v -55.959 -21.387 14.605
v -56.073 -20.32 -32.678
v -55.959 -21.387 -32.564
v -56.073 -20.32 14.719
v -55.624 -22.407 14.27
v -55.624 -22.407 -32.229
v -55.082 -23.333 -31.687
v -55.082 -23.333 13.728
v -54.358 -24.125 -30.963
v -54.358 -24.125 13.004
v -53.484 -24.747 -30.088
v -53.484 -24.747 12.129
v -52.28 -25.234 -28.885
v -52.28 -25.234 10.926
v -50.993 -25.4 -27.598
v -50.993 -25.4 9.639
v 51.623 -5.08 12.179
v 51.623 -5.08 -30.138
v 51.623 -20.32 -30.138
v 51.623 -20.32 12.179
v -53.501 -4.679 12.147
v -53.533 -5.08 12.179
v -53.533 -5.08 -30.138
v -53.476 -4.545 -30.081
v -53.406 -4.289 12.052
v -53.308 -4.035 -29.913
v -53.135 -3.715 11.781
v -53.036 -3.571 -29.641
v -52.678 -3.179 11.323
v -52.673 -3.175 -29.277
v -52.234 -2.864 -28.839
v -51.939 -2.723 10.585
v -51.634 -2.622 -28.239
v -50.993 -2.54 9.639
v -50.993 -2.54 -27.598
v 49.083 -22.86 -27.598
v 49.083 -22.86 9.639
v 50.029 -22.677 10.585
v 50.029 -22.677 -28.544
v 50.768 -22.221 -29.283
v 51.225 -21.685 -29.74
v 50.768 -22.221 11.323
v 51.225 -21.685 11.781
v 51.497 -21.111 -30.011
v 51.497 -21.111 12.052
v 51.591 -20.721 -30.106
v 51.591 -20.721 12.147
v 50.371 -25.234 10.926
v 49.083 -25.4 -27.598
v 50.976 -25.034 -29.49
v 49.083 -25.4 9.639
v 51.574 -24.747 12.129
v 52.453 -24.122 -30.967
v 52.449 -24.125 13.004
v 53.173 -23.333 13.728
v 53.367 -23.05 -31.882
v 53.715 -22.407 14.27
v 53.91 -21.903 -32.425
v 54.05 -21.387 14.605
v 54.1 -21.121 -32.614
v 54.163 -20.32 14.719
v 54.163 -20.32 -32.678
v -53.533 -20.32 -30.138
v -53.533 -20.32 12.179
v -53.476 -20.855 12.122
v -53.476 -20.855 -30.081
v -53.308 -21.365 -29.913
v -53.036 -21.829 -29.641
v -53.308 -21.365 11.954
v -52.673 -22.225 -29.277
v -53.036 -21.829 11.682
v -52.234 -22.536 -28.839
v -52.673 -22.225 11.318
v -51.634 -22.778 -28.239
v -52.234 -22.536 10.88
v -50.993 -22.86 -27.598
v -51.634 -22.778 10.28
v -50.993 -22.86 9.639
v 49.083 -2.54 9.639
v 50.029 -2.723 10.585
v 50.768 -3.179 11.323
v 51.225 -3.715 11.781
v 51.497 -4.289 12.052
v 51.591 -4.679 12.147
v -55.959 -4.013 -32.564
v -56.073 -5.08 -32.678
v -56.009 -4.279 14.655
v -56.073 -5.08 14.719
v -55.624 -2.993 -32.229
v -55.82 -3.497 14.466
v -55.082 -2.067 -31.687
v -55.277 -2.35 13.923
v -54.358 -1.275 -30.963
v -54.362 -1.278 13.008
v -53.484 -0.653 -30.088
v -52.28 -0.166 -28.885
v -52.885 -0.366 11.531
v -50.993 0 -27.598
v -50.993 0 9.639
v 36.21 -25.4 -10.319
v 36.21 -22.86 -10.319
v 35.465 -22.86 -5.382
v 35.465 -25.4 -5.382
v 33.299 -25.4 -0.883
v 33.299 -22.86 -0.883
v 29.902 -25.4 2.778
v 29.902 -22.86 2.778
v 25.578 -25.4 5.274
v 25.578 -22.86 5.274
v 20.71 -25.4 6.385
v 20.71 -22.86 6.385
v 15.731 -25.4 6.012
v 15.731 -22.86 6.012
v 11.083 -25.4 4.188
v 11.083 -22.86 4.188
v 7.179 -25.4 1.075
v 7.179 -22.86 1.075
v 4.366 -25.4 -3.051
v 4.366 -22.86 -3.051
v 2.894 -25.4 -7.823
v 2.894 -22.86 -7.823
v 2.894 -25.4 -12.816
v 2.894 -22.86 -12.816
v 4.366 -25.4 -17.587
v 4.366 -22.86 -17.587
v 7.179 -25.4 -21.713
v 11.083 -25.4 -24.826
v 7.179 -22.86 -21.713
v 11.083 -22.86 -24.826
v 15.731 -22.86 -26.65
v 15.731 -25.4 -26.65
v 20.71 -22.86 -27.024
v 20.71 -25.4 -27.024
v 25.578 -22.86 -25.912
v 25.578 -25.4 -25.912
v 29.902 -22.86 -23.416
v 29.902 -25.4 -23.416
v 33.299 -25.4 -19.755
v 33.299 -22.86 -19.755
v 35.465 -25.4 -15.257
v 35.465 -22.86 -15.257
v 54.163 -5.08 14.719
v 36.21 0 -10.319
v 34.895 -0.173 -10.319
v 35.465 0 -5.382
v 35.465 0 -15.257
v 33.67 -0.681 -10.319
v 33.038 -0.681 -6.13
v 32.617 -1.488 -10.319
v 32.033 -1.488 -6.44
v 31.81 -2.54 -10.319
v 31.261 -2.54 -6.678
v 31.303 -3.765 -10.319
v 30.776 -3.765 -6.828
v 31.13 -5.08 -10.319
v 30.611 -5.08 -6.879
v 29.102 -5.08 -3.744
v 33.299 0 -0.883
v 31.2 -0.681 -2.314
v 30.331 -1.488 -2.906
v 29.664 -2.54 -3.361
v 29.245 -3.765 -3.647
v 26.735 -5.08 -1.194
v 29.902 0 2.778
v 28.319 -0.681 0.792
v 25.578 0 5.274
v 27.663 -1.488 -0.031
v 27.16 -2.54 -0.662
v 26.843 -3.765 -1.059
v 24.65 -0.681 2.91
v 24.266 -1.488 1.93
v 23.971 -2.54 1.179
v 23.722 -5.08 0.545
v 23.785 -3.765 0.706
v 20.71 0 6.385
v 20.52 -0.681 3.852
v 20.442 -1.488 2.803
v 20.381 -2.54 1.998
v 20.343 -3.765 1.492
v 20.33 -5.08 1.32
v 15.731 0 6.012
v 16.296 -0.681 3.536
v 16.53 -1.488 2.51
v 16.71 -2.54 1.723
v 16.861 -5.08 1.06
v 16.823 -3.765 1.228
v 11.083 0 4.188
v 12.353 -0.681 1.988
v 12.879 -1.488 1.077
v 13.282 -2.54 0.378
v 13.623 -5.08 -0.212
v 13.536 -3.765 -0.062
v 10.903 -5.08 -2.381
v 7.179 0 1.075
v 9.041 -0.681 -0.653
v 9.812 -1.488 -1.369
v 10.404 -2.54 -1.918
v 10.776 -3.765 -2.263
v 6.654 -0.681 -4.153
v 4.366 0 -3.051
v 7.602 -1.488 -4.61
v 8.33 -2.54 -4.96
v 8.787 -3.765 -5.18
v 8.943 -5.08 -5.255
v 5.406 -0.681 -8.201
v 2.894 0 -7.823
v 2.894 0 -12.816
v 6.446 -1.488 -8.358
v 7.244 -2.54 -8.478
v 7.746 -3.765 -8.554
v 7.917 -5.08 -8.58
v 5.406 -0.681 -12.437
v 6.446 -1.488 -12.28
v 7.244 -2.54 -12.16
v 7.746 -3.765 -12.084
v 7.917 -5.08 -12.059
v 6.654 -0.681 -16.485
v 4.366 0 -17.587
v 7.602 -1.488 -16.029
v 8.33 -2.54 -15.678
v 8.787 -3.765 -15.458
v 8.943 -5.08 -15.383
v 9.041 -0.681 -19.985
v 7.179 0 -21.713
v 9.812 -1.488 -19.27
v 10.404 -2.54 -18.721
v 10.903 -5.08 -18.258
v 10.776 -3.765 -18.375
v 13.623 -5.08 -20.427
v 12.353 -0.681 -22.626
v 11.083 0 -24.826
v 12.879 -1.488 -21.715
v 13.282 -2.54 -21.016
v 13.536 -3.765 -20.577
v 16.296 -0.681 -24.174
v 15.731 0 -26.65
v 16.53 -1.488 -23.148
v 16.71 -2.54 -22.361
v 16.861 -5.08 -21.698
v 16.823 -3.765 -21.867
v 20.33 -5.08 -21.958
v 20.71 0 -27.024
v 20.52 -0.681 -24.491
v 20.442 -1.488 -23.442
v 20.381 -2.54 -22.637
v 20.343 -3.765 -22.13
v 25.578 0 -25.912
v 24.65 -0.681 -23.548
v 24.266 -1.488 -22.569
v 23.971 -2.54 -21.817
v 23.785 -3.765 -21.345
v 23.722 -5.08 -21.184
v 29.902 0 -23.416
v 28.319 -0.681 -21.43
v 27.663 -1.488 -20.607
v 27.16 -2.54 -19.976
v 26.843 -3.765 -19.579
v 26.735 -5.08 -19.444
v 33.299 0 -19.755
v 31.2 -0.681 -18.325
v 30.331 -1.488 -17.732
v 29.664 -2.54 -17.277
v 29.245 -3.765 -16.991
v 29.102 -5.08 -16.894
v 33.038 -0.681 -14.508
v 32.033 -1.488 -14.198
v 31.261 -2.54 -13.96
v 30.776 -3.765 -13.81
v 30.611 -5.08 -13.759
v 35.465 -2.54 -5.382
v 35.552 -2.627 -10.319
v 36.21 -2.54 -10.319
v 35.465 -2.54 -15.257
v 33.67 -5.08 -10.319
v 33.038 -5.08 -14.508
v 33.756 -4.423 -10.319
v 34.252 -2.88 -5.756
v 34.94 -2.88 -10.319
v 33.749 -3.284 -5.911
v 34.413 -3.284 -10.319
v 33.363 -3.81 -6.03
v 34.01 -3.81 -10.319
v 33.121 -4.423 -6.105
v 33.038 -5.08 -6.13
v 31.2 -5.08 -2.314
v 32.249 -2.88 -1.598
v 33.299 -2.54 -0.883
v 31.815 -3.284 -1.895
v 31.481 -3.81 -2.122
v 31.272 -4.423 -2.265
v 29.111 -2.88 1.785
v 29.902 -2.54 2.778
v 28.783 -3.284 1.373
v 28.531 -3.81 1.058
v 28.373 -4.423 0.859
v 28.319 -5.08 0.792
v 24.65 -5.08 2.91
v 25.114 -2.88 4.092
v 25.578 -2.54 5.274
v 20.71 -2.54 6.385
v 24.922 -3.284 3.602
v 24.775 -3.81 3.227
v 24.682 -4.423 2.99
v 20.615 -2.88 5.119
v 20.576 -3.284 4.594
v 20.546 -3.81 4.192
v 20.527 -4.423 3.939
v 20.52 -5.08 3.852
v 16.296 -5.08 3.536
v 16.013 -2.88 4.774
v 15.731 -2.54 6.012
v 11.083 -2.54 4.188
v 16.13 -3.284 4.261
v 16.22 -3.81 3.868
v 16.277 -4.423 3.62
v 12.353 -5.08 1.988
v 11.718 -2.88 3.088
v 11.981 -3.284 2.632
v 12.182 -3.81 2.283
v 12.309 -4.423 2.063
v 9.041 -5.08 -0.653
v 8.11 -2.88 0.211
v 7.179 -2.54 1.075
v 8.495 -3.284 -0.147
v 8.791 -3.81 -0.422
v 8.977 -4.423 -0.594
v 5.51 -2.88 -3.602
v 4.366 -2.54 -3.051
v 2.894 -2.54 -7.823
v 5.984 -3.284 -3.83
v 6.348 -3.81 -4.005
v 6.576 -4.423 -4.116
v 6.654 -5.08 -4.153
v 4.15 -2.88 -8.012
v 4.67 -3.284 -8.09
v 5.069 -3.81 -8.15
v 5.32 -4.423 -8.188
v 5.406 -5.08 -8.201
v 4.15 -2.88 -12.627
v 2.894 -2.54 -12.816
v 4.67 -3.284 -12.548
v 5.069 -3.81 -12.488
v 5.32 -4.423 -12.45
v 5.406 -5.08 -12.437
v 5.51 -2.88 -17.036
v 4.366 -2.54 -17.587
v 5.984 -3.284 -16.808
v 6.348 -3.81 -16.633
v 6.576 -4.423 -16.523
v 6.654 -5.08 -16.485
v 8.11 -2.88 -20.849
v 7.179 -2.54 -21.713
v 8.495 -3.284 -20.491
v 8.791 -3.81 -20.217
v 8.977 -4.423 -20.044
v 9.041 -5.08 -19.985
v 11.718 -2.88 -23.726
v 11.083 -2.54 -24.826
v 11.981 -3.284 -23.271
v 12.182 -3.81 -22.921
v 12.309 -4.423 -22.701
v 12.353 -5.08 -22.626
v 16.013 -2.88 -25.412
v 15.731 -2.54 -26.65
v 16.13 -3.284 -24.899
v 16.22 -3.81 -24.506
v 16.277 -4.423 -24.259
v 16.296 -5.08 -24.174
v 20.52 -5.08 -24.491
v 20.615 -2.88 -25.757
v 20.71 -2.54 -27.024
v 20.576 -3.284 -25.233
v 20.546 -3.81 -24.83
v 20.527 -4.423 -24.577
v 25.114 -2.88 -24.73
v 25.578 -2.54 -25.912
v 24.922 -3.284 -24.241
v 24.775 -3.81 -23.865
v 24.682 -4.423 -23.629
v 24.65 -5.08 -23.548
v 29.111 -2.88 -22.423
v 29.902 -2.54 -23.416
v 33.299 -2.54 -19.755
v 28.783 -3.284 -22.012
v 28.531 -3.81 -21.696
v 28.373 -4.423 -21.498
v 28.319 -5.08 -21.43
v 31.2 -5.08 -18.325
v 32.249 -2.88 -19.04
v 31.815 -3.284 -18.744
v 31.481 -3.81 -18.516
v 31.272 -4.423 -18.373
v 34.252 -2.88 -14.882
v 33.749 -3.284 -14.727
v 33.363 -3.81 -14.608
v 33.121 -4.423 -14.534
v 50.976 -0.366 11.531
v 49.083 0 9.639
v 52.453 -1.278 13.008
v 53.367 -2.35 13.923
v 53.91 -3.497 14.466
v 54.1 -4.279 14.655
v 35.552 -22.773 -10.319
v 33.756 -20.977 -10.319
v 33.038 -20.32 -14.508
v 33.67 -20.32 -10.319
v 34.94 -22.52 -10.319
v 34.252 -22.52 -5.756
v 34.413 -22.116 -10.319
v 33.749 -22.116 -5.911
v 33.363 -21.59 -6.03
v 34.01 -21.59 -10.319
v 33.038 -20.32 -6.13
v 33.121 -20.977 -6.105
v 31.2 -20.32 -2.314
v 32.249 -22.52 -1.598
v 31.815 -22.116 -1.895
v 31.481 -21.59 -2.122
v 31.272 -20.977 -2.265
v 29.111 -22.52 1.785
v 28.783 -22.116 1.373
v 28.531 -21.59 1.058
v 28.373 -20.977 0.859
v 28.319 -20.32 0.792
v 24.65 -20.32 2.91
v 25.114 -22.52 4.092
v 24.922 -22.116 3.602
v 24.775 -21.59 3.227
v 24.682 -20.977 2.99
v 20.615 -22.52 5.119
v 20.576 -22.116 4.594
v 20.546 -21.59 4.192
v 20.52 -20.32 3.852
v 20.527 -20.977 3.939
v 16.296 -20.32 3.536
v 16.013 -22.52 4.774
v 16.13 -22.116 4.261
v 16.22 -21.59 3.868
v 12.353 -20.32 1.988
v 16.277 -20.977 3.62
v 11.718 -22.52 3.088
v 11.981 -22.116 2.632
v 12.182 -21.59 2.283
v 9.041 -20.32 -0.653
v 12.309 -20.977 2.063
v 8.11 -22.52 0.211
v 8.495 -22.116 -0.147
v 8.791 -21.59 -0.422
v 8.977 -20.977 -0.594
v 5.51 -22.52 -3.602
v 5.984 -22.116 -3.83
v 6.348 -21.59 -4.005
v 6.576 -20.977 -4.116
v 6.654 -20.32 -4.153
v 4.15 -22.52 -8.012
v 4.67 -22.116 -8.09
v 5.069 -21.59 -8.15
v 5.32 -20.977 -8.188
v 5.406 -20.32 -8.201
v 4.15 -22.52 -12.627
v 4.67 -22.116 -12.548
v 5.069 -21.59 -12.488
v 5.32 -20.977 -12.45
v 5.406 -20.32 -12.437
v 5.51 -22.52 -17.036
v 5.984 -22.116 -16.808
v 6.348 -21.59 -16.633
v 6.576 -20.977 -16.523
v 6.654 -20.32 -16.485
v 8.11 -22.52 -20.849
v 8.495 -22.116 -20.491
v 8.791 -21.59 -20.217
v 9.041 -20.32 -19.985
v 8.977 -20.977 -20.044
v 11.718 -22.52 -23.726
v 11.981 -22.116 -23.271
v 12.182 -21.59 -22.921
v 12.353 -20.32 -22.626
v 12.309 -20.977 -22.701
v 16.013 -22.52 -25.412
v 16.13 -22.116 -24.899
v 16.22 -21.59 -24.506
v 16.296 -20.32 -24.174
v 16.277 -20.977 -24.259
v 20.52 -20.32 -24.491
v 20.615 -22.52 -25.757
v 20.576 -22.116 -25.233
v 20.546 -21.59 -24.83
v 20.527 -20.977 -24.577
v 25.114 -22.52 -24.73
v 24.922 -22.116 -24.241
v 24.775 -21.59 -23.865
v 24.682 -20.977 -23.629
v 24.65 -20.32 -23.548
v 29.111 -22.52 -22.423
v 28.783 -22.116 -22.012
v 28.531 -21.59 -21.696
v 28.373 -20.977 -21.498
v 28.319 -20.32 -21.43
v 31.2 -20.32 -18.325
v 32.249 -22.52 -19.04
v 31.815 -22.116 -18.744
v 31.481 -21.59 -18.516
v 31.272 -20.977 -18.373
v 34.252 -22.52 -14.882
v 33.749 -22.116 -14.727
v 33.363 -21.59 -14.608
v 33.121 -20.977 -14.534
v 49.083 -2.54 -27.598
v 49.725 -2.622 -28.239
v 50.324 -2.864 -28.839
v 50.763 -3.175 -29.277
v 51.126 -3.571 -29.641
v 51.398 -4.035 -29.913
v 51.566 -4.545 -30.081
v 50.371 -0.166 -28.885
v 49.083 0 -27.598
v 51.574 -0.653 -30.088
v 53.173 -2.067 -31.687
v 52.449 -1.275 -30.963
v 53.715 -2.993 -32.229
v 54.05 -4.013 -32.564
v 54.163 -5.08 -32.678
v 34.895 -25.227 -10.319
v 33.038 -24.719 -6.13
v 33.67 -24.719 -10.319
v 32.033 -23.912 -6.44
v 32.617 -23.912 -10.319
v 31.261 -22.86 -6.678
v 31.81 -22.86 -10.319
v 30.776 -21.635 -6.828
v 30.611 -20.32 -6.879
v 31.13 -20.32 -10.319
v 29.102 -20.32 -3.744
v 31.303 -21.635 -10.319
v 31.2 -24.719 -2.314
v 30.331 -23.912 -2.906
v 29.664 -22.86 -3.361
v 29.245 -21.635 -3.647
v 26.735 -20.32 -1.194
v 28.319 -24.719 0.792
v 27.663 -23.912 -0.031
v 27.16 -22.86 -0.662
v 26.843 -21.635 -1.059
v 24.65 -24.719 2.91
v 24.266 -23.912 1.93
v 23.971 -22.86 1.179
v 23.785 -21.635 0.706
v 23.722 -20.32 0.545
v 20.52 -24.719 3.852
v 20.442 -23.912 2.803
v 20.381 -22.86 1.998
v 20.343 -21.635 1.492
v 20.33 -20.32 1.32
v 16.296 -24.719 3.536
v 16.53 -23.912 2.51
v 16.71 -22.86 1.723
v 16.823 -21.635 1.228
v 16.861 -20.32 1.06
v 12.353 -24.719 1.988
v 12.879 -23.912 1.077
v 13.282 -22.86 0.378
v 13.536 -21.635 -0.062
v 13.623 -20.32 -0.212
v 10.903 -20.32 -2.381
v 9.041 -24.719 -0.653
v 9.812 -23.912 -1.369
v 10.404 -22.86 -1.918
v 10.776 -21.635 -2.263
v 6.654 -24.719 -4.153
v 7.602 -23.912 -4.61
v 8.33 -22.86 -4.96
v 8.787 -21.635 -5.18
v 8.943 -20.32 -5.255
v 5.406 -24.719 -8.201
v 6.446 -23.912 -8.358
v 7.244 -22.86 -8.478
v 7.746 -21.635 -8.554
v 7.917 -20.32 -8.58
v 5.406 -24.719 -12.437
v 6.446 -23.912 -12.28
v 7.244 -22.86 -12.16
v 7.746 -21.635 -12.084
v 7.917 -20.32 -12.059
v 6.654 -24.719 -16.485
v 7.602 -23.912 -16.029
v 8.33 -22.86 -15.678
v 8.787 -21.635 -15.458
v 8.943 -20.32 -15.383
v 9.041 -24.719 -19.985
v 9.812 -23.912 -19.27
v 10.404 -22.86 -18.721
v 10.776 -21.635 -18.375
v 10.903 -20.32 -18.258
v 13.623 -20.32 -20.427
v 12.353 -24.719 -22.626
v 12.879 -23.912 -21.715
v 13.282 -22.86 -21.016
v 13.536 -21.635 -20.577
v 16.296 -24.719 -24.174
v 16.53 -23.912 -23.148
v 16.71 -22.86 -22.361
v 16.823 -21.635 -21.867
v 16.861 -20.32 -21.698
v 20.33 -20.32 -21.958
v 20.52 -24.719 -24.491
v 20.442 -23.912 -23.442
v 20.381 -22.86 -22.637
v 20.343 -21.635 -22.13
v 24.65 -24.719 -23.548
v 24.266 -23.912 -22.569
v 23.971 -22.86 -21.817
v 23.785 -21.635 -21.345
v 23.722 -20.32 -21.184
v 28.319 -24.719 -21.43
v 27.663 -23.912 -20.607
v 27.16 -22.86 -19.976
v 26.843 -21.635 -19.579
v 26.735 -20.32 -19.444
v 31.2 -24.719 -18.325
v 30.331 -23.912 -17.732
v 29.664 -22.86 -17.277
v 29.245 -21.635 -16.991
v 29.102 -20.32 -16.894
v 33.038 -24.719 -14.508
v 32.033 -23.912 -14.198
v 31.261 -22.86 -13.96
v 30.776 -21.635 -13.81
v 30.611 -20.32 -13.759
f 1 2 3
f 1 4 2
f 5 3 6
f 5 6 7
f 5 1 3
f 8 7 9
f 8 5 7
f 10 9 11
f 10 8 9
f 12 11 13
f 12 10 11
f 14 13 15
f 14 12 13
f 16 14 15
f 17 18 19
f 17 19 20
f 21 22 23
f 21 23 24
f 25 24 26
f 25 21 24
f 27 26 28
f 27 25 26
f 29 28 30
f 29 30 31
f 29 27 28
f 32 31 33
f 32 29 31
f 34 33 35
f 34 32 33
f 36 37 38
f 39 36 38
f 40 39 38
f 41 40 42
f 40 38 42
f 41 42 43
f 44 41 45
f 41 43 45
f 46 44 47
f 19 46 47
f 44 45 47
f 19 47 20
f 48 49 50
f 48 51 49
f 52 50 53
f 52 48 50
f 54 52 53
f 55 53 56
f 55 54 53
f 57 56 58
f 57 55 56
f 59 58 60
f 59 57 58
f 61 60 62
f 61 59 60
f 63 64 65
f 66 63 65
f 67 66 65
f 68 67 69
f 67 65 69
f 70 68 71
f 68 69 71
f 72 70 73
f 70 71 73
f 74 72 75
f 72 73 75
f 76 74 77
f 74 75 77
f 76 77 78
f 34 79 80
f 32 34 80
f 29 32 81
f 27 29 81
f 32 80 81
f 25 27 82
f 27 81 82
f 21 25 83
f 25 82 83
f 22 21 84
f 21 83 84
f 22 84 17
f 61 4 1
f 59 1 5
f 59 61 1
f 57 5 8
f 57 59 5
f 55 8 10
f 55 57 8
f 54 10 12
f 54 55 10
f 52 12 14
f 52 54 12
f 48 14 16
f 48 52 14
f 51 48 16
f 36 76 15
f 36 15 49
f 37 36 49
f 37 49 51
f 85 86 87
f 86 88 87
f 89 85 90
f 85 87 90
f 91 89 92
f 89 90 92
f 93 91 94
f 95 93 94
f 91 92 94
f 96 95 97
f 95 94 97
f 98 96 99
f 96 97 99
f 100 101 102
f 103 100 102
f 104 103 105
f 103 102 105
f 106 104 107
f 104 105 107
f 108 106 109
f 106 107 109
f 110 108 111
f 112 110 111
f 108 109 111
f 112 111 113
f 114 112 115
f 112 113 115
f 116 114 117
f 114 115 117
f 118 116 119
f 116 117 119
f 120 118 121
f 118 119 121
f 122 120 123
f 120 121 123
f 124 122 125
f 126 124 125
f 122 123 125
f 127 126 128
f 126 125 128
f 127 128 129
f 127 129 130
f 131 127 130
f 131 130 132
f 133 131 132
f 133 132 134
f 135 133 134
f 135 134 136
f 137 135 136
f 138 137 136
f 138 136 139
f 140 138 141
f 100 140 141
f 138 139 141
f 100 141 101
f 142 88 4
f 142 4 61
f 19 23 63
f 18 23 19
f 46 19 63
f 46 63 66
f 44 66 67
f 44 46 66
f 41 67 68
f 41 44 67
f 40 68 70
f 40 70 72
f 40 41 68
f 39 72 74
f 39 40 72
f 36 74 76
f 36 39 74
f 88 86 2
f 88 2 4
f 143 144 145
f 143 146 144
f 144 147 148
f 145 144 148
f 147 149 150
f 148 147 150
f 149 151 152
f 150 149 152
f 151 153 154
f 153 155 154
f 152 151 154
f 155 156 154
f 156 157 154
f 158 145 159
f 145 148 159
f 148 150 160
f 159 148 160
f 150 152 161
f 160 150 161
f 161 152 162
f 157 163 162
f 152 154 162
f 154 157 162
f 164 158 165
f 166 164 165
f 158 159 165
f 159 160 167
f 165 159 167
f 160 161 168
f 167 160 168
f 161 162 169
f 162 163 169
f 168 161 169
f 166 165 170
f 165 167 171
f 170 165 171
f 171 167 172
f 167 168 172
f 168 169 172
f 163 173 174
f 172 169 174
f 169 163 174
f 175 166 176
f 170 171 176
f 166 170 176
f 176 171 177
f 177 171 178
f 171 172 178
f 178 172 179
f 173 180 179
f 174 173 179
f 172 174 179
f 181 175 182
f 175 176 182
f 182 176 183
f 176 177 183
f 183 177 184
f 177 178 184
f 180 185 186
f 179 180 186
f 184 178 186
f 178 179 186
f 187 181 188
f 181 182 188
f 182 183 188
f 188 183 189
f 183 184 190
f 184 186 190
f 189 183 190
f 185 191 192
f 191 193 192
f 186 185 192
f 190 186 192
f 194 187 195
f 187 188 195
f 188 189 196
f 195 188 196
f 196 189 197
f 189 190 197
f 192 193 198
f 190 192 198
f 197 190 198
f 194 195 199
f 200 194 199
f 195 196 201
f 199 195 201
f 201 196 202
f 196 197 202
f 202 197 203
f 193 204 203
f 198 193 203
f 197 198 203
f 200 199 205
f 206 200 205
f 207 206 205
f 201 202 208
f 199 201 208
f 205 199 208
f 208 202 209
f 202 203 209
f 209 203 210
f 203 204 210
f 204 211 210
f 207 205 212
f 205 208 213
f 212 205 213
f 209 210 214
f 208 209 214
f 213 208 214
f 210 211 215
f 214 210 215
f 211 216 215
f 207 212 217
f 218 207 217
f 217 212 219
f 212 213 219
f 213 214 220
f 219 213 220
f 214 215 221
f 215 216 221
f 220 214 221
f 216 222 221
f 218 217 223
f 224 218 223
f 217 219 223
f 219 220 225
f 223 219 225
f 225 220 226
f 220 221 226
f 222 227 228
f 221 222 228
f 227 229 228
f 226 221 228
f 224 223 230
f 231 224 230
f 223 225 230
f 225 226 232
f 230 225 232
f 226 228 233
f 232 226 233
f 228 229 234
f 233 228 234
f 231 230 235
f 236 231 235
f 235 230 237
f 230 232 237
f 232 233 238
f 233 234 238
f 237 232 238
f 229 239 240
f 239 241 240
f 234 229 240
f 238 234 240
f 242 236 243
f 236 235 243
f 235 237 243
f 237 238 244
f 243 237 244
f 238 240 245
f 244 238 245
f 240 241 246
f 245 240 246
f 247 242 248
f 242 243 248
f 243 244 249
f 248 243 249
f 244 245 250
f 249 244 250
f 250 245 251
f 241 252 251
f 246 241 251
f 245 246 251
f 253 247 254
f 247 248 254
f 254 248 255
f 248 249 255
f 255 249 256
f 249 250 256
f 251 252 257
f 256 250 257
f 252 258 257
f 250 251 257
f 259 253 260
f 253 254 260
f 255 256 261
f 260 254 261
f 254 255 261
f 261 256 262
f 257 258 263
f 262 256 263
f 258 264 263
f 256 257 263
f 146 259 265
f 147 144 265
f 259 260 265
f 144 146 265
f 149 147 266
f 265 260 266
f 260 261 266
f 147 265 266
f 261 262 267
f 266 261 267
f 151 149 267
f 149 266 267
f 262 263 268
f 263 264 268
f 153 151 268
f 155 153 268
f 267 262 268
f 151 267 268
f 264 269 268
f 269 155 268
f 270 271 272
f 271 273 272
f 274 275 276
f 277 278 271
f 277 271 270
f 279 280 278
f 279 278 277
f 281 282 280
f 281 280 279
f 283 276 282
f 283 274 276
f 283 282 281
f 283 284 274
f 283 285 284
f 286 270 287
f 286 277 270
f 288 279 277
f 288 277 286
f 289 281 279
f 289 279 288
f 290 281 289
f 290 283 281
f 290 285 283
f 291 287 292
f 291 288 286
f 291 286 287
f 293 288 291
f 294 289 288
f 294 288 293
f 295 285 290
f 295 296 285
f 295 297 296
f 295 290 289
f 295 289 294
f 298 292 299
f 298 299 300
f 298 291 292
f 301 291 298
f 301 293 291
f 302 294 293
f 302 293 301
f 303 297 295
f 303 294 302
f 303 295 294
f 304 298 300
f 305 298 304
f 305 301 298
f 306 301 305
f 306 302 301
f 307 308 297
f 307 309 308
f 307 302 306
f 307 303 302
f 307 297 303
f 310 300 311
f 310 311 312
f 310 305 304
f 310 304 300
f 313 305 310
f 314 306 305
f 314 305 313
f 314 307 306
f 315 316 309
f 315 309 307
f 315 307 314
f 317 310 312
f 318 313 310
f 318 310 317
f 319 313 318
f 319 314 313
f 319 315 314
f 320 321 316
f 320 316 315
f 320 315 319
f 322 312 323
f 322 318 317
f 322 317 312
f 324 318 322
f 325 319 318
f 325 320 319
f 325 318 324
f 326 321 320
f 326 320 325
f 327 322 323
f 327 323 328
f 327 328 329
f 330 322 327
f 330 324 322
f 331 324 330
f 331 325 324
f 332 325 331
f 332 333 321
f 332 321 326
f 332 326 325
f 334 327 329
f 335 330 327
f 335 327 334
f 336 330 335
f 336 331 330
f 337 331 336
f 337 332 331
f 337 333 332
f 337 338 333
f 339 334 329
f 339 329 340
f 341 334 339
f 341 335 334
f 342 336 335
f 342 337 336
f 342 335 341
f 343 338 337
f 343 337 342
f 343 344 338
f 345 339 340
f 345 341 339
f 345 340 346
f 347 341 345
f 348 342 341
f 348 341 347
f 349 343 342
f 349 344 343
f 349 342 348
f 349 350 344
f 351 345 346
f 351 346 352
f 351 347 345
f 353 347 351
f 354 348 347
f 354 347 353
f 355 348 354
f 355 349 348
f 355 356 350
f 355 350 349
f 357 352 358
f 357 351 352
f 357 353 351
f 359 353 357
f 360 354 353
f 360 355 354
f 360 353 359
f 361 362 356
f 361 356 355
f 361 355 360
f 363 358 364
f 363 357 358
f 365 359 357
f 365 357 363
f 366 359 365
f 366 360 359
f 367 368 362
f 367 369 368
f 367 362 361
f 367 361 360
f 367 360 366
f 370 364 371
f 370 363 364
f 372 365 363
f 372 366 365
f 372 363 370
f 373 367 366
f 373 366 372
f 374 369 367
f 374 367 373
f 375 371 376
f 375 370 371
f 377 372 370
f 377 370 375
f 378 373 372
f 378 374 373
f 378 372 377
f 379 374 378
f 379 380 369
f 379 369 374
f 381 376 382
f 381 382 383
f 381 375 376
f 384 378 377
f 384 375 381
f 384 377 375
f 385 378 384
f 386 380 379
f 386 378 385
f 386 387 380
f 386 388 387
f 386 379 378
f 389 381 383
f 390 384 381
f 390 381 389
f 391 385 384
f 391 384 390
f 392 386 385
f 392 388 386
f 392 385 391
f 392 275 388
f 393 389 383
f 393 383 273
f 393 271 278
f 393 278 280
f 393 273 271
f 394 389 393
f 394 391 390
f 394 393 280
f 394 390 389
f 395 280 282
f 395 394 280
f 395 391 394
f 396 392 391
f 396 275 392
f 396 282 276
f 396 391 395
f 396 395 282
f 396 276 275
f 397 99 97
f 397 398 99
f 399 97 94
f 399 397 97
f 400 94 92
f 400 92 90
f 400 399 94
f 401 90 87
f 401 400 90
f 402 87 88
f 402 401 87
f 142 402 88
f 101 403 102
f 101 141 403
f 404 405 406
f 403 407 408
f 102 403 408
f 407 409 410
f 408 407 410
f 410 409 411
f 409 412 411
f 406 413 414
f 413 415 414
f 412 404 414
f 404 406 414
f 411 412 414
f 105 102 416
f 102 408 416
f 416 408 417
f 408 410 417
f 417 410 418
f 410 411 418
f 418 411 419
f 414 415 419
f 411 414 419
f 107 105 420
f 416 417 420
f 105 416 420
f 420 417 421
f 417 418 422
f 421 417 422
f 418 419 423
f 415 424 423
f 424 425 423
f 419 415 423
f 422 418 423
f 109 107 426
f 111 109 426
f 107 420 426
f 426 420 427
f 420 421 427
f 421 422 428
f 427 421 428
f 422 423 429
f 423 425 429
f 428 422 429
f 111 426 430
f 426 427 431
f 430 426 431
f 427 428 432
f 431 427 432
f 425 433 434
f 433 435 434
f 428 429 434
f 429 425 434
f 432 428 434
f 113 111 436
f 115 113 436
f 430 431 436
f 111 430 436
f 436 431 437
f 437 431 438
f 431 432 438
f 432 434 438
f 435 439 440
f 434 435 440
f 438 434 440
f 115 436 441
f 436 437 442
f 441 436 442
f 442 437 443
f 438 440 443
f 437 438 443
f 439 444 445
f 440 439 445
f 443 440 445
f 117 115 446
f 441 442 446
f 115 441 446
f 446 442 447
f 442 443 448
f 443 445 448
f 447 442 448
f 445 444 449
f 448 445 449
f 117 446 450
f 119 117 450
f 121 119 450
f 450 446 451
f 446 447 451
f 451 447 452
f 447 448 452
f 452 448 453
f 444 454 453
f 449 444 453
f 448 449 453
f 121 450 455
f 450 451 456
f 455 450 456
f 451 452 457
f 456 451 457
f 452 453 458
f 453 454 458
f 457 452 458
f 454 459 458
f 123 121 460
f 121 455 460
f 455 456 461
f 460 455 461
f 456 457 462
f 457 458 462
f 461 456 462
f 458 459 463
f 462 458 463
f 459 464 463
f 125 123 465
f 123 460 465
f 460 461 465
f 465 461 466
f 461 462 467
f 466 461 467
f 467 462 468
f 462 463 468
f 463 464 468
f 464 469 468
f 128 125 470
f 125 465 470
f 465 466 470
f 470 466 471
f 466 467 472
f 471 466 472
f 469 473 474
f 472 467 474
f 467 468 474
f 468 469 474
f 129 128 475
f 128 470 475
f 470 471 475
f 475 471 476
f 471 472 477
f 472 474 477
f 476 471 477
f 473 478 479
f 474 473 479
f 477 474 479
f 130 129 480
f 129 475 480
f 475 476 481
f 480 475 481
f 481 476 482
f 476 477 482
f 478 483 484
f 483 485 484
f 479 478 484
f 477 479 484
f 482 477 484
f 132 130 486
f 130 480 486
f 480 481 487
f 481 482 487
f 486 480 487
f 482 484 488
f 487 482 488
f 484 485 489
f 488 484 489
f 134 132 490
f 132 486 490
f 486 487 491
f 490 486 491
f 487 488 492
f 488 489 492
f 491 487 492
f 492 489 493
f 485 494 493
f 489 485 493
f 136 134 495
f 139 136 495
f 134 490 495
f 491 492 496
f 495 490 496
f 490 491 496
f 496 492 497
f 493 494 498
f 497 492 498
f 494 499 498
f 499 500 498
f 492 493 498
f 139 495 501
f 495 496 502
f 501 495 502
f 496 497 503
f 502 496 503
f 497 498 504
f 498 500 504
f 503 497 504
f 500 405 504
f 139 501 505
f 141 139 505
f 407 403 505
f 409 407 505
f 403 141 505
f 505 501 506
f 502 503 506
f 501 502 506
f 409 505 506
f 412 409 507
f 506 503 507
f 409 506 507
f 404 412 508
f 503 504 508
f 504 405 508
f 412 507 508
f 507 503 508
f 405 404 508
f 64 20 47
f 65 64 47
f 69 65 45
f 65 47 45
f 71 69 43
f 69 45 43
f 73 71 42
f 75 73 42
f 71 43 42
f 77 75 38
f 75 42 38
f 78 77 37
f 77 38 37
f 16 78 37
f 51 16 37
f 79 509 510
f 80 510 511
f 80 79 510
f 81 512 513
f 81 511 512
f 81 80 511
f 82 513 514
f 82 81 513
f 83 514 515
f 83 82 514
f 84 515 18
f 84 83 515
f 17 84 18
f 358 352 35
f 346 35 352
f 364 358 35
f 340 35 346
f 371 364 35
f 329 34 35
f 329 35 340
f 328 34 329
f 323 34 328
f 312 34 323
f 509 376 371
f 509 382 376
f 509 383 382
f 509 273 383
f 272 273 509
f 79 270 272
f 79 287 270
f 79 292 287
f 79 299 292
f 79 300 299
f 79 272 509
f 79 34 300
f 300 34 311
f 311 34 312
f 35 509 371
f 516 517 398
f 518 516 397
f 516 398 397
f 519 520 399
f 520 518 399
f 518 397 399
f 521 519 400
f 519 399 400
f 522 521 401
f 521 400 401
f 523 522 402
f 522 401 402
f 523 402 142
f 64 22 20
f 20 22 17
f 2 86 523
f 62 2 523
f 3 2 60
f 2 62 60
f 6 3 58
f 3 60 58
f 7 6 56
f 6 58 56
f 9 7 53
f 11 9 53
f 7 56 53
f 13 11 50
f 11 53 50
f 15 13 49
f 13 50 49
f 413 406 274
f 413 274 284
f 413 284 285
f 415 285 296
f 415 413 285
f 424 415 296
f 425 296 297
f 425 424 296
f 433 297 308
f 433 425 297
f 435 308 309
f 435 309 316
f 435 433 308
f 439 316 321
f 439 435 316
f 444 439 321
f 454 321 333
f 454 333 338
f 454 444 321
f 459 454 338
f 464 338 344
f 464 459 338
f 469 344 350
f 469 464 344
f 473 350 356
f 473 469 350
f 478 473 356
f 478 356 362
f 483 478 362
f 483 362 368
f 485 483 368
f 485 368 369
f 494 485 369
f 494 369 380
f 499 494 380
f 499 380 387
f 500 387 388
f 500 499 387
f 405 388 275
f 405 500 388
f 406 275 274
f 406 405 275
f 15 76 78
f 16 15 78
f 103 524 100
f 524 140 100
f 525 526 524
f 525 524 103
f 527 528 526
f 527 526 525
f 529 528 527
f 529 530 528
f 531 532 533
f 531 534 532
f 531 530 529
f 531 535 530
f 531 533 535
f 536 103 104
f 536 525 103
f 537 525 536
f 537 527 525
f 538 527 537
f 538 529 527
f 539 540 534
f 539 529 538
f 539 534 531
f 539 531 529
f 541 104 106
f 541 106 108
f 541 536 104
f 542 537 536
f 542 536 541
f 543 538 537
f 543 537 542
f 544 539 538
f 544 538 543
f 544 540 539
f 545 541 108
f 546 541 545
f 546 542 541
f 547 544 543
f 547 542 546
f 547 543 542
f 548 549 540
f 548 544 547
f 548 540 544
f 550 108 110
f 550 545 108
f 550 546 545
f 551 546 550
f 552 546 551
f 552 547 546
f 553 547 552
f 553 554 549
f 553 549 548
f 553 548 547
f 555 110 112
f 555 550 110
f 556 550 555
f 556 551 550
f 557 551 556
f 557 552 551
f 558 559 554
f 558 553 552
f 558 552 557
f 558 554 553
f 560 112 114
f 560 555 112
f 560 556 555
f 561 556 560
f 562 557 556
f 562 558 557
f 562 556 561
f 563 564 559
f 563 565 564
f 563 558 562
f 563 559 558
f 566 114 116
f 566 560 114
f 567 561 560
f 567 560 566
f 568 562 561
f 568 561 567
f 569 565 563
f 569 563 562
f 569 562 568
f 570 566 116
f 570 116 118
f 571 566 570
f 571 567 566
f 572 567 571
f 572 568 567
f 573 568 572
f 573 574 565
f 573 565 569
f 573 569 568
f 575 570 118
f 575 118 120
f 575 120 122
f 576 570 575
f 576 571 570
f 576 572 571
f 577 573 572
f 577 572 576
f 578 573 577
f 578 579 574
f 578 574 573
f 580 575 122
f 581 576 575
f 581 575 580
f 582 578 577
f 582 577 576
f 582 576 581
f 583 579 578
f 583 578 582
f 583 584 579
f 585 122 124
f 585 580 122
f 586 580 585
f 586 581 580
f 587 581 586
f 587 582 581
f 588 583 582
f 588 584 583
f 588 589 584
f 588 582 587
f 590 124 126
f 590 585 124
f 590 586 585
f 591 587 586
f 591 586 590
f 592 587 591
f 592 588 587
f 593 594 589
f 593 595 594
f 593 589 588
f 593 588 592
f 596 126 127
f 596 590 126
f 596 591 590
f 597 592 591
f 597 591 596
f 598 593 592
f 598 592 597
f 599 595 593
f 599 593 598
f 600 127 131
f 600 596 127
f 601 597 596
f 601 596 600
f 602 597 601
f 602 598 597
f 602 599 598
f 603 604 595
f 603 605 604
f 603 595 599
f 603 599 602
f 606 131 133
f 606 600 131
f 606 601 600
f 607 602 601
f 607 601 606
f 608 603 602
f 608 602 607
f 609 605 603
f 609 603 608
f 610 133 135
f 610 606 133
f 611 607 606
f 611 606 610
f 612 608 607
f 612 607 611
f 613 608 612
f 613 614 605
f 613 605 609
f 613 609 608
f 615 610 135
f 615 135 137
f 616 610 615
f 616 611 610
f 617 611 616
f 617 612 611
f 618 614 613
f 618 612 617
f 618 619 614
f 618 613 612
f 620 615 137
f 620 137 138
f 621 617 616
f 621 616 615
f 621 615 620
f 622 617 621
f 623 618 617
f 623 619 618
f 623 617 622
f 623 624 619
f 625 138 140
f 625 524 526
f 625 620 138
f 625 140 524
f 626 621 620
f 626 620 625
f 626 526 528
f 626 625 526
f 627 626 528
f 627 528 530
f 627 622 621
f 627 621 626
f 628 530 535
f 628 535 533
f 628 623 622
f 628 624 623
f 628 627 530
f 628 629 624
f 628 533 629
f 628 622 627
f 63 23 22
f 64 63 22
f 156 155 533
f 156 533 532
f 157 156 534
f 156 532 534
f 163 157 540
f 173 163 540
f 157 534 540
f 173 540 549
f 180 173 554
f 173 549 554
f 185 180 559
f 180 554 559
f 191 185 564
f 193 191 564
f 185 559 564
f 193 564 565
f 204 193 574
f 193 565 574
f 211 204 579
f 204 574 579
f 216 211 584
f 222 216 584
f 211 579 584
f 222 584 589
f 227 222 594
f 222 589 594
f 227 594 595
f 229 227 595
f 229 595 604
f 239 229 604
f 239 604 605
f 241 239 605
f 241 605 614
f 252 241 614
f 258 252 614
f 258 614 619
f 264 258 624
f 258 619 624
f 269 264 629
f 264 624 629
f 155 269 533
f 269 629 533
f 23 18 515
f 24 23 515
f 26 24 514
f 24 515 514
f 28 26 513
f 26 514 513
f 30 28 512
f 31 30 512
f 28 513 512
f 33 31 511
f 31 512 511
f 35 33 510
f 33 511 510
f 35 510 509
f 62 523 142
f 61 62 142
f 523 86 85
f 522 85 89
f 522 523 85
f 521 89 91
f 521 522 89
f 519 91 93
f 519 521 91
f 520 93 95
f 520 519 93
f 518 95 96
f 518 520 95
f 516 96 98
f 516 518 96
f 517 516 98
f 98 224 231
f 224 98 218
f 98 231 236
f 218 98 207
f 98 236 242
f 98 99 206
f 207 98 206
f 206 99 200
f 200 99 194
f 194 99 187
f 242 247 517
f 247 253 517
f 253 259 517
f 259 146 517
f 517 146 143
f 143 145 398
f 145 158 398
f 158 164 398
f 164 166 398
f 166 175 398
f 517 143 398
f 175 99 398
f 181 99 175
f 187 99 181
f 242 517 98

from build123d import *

# Parameters (mm, degrees)
F0_W     = 110.236
F0_H     = 47.3964
F1_DEPTH = 25.4
F2_R     = 11.6713
F3_DEPTH = 25.4
F4_R     = 5.08
F5_R     = 5.08
F6_T     = -2.54


# Not quite as in the source:
# - a shell that OpenCascade refuses in one call is made with other operations: the cavity is built on its own and cut out


with BuildPart() as f1:
    # F0 (on Front) → F1 (new body)
    with BuildSketch(Plane.XZ):
        with Locations((-0.954773277, -8.9795228673)):
            Rectangle(F0_W, F0_H)
    extrude(amount=F1_DEPTH)

    # F2 (on face) → F3 (cut, through all)
    with BuildSketch(Plane.XZ.offset(25.4)):
        with Locations((19.4582305849, -10.3191519156)):
            Circle(F2_R)
    extrude(amount=-F3_DEPTH, mode=Mode.SUBTRACT)

    # F4
    f4_edges = [f1.edges().sort_by_distance(p)[0] for p in [
        (7.786931, -25.4, -10.319152),
        (-0.954773, -25.4, 14.718677),
        (54.163227, -25.4, -8.979523),
        (-0.954773, -25.4, -32.677723),
        (-56.072773, -25.4, -8.979523),
        (7.786931, 0, -10.319152),
    ]]
    fillet(f4_edges, radius=F4_R)

    # F5
    f5_edges = [f1.edges().sort_by_distance(p)[0] for p in [
        (-0.954773, 0, 14.718677),
        (-56.072773, 0, -8.979523),
        (-0.954773, 0, -32.677723),
        (54.163227, 0, -8.979523),
    ]]
    fillet(f5_edges, radius=F5_R)

    # F6: a shell. OpenCascade refuses it in one call, so the cavity is built on its own and cut out:
    # the body offset inwards by the wall thickness, plus a prism from it out through each open face.
    f6_core = offset(f1.part, amount=F6_T, mode=Mode.PRIVATE)
    f6_exits = [f6_core.faces().sort_by_distance(p)[0] for p in [
        (-7.280112, -22.86, -8.564415),
    ]]
    add(f6_core, mode=Mode.SUBTRACT)
    extrude(f6_exits, amount=-F6_T, mode=Mode.SUBTRACT)


solid = f1.part
